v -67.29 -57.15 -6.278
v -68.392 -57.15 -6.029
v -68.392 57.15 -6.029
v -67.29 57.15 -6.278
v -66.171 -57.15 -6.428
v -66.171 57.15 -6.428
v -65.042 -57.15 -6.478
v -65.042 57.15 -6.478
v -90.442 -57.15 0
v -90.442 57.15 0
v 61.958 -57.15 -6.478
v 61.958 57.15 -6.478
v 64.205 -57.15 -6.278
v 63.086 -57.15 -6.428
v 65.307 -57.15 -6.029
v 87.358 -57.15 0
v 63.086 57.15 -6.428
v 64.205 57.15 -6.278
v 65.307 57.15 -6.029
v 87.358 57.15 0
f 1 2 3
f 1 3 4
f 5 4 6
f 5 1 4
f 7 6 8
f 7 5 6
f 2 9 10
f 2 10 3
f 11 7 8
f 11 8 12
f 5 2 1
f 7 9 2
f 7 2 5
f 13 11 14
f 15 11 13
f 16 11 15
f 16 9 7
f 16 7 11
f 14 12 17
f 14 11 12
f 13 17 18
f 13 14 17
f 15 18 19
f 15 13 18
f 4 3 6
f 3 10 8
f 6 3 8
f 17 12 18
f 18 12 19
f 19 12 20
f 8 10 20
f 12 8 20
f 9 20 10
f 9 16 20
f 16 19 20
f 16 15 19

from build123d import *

# Parameters (mm, degrees)
F1_DEPTH      = 57.15
F1_DEPTH_BACK = 57.15


with BuildPart() as f1:
    # F0 (on Front) → F1 (new body, two sides)
    with BuildSketch(Plane.XZ) as f1_sk:
        with BuildLine():
            Line((87.35775, 0), (-90.44225, 0))
            Line((-90.44225, 0), (-68.391527, -6.028698))
            ThreePointArc((-68.391527, -6.028698), (-66.731909, -6.365395), (-65.04225, -6.478296))
            Line((-65.04225, -6.478296), (61.95775, -6.478296))
            ThreePointArc((61.95775, -6.478296), (63.647409, -6.365395), (65.307026, -6.028698))
            Line((65.307026, -6.028698), (87.35775, 0))
        make_face()
    extrude(amount=F1_DEPTH)
    extrude(f1_sk.sketch, amount=-F1_DEPTH_BACK)


solid = f1.part
